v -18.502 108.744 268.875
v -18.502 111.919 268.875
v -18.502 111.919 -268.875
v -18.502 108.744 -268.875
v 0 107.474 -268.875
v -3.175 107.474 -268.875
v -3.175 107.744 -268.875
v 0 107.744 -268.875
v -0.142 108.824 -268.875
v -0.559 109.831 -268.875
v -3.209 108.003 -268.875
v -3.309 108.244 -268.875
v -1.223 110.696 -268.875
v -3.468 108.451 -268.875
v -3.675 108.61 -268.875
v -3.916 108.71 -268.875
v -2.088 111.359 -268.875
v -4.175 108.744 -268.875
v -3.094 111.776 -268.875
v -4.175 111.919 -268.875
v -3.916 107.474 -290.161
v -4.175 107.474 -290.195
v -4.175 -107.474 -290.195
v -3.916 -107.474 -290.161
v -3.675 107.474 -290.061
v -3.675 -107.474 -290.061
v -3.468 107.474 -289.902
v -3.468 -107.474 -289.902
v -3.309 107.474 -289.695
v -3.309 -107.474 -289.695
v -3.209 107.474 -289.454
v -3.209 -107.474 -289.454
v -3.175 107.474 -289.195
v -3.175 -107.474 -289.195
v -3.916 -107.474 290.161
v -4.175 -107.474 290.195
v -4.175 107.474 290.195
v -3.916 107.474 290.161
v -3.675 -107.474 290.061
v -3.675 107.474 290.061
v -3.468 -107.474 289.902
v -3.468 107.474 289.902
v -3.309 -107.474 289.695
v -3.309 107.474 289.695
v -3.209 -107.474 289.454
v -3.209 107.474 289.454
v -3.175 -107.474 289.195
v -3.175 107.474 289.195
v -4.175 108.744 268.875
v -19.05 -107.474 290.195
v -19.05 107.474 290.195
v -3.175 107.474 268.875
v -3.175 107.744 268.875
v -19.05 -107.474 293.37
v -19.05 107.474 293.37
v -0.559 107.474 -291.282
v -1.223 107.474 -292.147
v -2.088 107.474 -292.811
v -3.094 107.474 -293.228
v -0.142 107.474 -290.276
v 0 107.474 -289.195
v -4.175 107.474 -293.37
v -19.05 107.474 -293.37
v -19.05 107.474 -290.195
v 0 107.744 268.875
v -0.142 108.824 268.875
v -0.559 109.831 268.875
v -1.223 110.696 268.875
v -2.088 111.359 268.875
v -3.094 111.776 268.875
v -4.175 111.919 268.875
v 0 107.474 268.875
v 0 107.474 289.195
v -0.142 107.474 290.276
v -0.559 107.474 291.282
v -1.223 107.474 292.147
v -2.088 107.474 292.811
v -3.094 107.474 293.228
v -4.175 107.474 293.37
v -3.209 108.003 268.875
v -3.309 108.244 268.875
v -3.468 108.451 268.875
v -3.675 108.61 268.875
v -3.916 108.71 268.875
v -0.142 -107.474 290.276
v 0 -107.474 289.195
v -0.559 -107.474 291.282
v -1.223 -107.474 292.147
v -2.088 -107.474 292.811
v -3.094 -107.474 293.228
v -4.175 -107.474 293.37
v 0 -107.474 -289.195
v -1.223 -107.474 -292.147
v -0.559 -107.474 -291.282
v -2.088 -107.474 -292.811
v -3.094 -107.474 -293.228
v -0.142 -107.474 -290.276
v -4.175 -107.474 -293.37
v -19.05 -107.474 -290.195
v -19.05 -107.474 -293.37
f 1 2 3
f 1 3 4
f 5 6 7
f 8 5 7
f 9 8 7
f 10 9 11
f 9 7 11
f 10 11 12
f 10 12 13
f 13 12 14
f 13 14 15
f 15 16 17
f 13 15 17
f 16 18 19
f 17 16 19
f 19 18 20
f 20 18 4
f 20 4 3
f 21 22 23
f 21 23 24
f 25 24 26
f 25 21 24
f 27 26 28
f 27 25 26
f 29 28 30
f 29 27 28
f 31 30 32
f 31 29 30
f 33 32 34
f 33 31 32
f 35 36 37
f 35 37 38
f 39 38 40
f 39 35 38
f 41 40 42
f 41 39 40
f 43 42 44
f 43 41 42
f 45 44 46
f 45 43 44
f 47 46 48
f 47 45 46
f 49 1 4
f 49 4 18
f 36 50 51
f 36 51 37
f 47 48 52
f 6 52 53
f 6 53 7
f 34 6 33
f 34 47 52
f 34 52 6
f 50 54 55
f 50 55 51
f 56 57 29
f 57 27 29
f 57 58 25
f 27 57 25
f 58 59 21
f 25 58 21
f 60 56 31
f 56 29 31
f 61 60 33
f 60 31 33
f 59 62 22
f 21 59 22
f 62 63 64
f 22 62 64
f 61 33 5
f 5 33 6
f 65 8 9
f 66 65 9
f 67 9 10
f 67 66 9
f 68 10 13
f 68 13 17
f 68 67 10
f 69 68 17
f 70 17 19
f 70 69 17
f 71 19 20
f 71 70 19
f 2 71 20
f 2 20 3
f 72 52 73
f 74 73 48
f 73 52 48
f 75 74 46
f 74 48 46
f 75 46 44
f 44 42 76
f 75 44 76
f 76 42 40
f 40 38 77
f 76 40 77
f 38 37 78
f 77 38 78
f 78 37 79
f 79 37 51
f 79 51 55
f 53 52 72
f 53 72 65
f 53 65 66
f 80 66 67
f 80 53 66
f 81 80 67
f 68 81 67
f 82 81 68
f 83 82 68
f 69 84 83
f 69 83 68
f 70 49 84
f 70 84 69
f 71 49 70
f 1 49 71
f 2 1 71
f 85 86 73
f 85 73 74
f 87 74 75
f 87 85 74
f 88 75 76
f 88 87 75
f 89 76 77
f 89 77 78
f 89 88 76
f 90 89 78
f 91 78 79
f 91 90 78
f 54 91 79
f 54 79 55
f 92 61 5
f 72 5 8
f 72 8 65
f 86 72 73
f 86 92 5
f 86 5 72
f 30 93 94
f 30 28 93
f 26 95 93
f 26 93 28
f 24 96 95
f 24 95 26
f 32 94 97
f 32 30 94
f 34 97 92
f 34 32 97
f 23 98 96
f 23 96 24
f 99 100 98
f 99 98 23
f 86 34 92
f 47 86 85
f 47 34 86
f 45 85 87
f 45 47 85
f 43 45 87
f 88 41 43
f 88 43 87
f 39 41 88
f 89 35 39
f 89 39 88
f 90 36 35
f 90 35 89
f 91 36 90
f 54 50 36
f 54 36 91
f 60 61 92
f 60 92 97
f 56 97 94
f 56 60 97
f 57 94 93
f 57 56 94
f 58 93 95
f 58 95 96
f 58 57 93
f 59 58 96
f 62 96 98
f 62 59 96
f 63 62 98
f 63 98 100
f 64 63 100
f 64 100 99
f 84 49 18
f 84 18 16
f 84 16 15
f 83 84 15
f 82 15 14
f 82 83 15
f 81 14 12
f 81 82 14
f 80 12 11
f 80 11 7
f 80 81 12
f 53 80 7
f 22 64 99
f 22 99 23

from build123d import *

# Parameters (mm, degrees)
SKETCH1_W               = 575.31
SKETCH1_H               = 214.9475
BASE_FLANGE1_DEPTH      = 3.175
EDGE_FLANGE1_DEPTH      = 214.9475
EDGE_FLANGE1_BEND_DEPTH = 214.9475
EDGE_FLANGE2_DEPTH      = 537.75


# Sheet-metal steps are written as plain solids
with BuildPart() as part:
    # Sketch1 → Base-Flange1 (new body)
    with BuildSketch(Plane(origin=(0, 0, 0), x_dir=(0, 0, -1), z_dir=(1, 0, 0))):
        Rectangle(SKETCH1_W, SKETCH1_H)
    extrude(amount=-BASE_FLANGE1_DEPTH)

    # Edge-Flange1 section (across the edge) → Edge-Flange1 (add)
    with BuildSketch(Plane(origin=(-3.175, 107.47375, -290.195), x_dir=(0, 0, 1), z_dir=(0, -1, 0))):
        with BuildLine():
            Line((-3.175, 1), (-3.175, 15.875))
            Line((-3.175, 15.875), (0, 15.875))
            Line((0, 15.875), (0, 1))
            ThreePointArc((0, 1), (0.292893219, 0.292893219), (1, 0))
            Line((1, 0), (2.54, 0))
            Line((2.54, 0), (2.54, -3.175))
            Line((2.54, -3.175), (1, -3.175))
            ThreePointArc((1, -3.175), (-1.952170811, -1.952170811), (-3.175, 1))
        make_face()
    extrude(amount=EDGE_FLANGE1_DEPTH)

    # Edge-Flange1 section 2 (across the edge) → Edge-Flange1 bend (add)
    with BuildSketch(Plane(origin=(-3.175, -107.47375, 290.195), x_dir=(0, 0, -1), z_dir=(0, 1, 0))):
        with BuildLine():
            Line((-3.175, 1), (-3.175, 15.875))
            Line((-3.175, 15.875), (0, 15.875))
            Line((0, 15.875), (0, 1))
            ThreePointArc((0, 1), (0.292893219, 0.292893219), (1, 0))
            Line((1, 0), (2.54, 0))
            Line((2.54, 0), (2.54, -3.175))
            Line((2.54, -3.175), (1, -3.175))
            ThreePointArc((1, -3.175), (-1.952170811, -1.952170811), (-3.175, 1))
        make_face()
    extrude(amount=EDGE_FLANGE1_BEND_DEPTH)

    # Edge-Flange2 section (across the edge) → Edge-Flange2 (add)
    with BuildSketch(Plane(origin=(-3.175, 108.74375, 268.875), x_dir=(0, -1, 0), z_dir=(0, 0, -1))):
        with BuildLine():
            Line((-3.175, 1), (-3.175, 15.326869713))
            Line((-3.175, 15.326869713), (0, 15.326869713))
            Line((0, 15.326869713), (0, 1))
            ThreePointArc((0, 1), (0.292893219, 0.292893219), (1, 0))
            Line((1, 0), (1.27, 0))
            Line((1.27, 0), (1.27, -3.175))
            Line((1.27, -3.175), (1, -3.175))
            ThreePointArc((1, -3.175), (-1.952170811, -1.952170811), (-3.175, 1))
        make_face()
    extrude(amount=EDGE_FLANGE2_DEPTH)


solid = part.part
